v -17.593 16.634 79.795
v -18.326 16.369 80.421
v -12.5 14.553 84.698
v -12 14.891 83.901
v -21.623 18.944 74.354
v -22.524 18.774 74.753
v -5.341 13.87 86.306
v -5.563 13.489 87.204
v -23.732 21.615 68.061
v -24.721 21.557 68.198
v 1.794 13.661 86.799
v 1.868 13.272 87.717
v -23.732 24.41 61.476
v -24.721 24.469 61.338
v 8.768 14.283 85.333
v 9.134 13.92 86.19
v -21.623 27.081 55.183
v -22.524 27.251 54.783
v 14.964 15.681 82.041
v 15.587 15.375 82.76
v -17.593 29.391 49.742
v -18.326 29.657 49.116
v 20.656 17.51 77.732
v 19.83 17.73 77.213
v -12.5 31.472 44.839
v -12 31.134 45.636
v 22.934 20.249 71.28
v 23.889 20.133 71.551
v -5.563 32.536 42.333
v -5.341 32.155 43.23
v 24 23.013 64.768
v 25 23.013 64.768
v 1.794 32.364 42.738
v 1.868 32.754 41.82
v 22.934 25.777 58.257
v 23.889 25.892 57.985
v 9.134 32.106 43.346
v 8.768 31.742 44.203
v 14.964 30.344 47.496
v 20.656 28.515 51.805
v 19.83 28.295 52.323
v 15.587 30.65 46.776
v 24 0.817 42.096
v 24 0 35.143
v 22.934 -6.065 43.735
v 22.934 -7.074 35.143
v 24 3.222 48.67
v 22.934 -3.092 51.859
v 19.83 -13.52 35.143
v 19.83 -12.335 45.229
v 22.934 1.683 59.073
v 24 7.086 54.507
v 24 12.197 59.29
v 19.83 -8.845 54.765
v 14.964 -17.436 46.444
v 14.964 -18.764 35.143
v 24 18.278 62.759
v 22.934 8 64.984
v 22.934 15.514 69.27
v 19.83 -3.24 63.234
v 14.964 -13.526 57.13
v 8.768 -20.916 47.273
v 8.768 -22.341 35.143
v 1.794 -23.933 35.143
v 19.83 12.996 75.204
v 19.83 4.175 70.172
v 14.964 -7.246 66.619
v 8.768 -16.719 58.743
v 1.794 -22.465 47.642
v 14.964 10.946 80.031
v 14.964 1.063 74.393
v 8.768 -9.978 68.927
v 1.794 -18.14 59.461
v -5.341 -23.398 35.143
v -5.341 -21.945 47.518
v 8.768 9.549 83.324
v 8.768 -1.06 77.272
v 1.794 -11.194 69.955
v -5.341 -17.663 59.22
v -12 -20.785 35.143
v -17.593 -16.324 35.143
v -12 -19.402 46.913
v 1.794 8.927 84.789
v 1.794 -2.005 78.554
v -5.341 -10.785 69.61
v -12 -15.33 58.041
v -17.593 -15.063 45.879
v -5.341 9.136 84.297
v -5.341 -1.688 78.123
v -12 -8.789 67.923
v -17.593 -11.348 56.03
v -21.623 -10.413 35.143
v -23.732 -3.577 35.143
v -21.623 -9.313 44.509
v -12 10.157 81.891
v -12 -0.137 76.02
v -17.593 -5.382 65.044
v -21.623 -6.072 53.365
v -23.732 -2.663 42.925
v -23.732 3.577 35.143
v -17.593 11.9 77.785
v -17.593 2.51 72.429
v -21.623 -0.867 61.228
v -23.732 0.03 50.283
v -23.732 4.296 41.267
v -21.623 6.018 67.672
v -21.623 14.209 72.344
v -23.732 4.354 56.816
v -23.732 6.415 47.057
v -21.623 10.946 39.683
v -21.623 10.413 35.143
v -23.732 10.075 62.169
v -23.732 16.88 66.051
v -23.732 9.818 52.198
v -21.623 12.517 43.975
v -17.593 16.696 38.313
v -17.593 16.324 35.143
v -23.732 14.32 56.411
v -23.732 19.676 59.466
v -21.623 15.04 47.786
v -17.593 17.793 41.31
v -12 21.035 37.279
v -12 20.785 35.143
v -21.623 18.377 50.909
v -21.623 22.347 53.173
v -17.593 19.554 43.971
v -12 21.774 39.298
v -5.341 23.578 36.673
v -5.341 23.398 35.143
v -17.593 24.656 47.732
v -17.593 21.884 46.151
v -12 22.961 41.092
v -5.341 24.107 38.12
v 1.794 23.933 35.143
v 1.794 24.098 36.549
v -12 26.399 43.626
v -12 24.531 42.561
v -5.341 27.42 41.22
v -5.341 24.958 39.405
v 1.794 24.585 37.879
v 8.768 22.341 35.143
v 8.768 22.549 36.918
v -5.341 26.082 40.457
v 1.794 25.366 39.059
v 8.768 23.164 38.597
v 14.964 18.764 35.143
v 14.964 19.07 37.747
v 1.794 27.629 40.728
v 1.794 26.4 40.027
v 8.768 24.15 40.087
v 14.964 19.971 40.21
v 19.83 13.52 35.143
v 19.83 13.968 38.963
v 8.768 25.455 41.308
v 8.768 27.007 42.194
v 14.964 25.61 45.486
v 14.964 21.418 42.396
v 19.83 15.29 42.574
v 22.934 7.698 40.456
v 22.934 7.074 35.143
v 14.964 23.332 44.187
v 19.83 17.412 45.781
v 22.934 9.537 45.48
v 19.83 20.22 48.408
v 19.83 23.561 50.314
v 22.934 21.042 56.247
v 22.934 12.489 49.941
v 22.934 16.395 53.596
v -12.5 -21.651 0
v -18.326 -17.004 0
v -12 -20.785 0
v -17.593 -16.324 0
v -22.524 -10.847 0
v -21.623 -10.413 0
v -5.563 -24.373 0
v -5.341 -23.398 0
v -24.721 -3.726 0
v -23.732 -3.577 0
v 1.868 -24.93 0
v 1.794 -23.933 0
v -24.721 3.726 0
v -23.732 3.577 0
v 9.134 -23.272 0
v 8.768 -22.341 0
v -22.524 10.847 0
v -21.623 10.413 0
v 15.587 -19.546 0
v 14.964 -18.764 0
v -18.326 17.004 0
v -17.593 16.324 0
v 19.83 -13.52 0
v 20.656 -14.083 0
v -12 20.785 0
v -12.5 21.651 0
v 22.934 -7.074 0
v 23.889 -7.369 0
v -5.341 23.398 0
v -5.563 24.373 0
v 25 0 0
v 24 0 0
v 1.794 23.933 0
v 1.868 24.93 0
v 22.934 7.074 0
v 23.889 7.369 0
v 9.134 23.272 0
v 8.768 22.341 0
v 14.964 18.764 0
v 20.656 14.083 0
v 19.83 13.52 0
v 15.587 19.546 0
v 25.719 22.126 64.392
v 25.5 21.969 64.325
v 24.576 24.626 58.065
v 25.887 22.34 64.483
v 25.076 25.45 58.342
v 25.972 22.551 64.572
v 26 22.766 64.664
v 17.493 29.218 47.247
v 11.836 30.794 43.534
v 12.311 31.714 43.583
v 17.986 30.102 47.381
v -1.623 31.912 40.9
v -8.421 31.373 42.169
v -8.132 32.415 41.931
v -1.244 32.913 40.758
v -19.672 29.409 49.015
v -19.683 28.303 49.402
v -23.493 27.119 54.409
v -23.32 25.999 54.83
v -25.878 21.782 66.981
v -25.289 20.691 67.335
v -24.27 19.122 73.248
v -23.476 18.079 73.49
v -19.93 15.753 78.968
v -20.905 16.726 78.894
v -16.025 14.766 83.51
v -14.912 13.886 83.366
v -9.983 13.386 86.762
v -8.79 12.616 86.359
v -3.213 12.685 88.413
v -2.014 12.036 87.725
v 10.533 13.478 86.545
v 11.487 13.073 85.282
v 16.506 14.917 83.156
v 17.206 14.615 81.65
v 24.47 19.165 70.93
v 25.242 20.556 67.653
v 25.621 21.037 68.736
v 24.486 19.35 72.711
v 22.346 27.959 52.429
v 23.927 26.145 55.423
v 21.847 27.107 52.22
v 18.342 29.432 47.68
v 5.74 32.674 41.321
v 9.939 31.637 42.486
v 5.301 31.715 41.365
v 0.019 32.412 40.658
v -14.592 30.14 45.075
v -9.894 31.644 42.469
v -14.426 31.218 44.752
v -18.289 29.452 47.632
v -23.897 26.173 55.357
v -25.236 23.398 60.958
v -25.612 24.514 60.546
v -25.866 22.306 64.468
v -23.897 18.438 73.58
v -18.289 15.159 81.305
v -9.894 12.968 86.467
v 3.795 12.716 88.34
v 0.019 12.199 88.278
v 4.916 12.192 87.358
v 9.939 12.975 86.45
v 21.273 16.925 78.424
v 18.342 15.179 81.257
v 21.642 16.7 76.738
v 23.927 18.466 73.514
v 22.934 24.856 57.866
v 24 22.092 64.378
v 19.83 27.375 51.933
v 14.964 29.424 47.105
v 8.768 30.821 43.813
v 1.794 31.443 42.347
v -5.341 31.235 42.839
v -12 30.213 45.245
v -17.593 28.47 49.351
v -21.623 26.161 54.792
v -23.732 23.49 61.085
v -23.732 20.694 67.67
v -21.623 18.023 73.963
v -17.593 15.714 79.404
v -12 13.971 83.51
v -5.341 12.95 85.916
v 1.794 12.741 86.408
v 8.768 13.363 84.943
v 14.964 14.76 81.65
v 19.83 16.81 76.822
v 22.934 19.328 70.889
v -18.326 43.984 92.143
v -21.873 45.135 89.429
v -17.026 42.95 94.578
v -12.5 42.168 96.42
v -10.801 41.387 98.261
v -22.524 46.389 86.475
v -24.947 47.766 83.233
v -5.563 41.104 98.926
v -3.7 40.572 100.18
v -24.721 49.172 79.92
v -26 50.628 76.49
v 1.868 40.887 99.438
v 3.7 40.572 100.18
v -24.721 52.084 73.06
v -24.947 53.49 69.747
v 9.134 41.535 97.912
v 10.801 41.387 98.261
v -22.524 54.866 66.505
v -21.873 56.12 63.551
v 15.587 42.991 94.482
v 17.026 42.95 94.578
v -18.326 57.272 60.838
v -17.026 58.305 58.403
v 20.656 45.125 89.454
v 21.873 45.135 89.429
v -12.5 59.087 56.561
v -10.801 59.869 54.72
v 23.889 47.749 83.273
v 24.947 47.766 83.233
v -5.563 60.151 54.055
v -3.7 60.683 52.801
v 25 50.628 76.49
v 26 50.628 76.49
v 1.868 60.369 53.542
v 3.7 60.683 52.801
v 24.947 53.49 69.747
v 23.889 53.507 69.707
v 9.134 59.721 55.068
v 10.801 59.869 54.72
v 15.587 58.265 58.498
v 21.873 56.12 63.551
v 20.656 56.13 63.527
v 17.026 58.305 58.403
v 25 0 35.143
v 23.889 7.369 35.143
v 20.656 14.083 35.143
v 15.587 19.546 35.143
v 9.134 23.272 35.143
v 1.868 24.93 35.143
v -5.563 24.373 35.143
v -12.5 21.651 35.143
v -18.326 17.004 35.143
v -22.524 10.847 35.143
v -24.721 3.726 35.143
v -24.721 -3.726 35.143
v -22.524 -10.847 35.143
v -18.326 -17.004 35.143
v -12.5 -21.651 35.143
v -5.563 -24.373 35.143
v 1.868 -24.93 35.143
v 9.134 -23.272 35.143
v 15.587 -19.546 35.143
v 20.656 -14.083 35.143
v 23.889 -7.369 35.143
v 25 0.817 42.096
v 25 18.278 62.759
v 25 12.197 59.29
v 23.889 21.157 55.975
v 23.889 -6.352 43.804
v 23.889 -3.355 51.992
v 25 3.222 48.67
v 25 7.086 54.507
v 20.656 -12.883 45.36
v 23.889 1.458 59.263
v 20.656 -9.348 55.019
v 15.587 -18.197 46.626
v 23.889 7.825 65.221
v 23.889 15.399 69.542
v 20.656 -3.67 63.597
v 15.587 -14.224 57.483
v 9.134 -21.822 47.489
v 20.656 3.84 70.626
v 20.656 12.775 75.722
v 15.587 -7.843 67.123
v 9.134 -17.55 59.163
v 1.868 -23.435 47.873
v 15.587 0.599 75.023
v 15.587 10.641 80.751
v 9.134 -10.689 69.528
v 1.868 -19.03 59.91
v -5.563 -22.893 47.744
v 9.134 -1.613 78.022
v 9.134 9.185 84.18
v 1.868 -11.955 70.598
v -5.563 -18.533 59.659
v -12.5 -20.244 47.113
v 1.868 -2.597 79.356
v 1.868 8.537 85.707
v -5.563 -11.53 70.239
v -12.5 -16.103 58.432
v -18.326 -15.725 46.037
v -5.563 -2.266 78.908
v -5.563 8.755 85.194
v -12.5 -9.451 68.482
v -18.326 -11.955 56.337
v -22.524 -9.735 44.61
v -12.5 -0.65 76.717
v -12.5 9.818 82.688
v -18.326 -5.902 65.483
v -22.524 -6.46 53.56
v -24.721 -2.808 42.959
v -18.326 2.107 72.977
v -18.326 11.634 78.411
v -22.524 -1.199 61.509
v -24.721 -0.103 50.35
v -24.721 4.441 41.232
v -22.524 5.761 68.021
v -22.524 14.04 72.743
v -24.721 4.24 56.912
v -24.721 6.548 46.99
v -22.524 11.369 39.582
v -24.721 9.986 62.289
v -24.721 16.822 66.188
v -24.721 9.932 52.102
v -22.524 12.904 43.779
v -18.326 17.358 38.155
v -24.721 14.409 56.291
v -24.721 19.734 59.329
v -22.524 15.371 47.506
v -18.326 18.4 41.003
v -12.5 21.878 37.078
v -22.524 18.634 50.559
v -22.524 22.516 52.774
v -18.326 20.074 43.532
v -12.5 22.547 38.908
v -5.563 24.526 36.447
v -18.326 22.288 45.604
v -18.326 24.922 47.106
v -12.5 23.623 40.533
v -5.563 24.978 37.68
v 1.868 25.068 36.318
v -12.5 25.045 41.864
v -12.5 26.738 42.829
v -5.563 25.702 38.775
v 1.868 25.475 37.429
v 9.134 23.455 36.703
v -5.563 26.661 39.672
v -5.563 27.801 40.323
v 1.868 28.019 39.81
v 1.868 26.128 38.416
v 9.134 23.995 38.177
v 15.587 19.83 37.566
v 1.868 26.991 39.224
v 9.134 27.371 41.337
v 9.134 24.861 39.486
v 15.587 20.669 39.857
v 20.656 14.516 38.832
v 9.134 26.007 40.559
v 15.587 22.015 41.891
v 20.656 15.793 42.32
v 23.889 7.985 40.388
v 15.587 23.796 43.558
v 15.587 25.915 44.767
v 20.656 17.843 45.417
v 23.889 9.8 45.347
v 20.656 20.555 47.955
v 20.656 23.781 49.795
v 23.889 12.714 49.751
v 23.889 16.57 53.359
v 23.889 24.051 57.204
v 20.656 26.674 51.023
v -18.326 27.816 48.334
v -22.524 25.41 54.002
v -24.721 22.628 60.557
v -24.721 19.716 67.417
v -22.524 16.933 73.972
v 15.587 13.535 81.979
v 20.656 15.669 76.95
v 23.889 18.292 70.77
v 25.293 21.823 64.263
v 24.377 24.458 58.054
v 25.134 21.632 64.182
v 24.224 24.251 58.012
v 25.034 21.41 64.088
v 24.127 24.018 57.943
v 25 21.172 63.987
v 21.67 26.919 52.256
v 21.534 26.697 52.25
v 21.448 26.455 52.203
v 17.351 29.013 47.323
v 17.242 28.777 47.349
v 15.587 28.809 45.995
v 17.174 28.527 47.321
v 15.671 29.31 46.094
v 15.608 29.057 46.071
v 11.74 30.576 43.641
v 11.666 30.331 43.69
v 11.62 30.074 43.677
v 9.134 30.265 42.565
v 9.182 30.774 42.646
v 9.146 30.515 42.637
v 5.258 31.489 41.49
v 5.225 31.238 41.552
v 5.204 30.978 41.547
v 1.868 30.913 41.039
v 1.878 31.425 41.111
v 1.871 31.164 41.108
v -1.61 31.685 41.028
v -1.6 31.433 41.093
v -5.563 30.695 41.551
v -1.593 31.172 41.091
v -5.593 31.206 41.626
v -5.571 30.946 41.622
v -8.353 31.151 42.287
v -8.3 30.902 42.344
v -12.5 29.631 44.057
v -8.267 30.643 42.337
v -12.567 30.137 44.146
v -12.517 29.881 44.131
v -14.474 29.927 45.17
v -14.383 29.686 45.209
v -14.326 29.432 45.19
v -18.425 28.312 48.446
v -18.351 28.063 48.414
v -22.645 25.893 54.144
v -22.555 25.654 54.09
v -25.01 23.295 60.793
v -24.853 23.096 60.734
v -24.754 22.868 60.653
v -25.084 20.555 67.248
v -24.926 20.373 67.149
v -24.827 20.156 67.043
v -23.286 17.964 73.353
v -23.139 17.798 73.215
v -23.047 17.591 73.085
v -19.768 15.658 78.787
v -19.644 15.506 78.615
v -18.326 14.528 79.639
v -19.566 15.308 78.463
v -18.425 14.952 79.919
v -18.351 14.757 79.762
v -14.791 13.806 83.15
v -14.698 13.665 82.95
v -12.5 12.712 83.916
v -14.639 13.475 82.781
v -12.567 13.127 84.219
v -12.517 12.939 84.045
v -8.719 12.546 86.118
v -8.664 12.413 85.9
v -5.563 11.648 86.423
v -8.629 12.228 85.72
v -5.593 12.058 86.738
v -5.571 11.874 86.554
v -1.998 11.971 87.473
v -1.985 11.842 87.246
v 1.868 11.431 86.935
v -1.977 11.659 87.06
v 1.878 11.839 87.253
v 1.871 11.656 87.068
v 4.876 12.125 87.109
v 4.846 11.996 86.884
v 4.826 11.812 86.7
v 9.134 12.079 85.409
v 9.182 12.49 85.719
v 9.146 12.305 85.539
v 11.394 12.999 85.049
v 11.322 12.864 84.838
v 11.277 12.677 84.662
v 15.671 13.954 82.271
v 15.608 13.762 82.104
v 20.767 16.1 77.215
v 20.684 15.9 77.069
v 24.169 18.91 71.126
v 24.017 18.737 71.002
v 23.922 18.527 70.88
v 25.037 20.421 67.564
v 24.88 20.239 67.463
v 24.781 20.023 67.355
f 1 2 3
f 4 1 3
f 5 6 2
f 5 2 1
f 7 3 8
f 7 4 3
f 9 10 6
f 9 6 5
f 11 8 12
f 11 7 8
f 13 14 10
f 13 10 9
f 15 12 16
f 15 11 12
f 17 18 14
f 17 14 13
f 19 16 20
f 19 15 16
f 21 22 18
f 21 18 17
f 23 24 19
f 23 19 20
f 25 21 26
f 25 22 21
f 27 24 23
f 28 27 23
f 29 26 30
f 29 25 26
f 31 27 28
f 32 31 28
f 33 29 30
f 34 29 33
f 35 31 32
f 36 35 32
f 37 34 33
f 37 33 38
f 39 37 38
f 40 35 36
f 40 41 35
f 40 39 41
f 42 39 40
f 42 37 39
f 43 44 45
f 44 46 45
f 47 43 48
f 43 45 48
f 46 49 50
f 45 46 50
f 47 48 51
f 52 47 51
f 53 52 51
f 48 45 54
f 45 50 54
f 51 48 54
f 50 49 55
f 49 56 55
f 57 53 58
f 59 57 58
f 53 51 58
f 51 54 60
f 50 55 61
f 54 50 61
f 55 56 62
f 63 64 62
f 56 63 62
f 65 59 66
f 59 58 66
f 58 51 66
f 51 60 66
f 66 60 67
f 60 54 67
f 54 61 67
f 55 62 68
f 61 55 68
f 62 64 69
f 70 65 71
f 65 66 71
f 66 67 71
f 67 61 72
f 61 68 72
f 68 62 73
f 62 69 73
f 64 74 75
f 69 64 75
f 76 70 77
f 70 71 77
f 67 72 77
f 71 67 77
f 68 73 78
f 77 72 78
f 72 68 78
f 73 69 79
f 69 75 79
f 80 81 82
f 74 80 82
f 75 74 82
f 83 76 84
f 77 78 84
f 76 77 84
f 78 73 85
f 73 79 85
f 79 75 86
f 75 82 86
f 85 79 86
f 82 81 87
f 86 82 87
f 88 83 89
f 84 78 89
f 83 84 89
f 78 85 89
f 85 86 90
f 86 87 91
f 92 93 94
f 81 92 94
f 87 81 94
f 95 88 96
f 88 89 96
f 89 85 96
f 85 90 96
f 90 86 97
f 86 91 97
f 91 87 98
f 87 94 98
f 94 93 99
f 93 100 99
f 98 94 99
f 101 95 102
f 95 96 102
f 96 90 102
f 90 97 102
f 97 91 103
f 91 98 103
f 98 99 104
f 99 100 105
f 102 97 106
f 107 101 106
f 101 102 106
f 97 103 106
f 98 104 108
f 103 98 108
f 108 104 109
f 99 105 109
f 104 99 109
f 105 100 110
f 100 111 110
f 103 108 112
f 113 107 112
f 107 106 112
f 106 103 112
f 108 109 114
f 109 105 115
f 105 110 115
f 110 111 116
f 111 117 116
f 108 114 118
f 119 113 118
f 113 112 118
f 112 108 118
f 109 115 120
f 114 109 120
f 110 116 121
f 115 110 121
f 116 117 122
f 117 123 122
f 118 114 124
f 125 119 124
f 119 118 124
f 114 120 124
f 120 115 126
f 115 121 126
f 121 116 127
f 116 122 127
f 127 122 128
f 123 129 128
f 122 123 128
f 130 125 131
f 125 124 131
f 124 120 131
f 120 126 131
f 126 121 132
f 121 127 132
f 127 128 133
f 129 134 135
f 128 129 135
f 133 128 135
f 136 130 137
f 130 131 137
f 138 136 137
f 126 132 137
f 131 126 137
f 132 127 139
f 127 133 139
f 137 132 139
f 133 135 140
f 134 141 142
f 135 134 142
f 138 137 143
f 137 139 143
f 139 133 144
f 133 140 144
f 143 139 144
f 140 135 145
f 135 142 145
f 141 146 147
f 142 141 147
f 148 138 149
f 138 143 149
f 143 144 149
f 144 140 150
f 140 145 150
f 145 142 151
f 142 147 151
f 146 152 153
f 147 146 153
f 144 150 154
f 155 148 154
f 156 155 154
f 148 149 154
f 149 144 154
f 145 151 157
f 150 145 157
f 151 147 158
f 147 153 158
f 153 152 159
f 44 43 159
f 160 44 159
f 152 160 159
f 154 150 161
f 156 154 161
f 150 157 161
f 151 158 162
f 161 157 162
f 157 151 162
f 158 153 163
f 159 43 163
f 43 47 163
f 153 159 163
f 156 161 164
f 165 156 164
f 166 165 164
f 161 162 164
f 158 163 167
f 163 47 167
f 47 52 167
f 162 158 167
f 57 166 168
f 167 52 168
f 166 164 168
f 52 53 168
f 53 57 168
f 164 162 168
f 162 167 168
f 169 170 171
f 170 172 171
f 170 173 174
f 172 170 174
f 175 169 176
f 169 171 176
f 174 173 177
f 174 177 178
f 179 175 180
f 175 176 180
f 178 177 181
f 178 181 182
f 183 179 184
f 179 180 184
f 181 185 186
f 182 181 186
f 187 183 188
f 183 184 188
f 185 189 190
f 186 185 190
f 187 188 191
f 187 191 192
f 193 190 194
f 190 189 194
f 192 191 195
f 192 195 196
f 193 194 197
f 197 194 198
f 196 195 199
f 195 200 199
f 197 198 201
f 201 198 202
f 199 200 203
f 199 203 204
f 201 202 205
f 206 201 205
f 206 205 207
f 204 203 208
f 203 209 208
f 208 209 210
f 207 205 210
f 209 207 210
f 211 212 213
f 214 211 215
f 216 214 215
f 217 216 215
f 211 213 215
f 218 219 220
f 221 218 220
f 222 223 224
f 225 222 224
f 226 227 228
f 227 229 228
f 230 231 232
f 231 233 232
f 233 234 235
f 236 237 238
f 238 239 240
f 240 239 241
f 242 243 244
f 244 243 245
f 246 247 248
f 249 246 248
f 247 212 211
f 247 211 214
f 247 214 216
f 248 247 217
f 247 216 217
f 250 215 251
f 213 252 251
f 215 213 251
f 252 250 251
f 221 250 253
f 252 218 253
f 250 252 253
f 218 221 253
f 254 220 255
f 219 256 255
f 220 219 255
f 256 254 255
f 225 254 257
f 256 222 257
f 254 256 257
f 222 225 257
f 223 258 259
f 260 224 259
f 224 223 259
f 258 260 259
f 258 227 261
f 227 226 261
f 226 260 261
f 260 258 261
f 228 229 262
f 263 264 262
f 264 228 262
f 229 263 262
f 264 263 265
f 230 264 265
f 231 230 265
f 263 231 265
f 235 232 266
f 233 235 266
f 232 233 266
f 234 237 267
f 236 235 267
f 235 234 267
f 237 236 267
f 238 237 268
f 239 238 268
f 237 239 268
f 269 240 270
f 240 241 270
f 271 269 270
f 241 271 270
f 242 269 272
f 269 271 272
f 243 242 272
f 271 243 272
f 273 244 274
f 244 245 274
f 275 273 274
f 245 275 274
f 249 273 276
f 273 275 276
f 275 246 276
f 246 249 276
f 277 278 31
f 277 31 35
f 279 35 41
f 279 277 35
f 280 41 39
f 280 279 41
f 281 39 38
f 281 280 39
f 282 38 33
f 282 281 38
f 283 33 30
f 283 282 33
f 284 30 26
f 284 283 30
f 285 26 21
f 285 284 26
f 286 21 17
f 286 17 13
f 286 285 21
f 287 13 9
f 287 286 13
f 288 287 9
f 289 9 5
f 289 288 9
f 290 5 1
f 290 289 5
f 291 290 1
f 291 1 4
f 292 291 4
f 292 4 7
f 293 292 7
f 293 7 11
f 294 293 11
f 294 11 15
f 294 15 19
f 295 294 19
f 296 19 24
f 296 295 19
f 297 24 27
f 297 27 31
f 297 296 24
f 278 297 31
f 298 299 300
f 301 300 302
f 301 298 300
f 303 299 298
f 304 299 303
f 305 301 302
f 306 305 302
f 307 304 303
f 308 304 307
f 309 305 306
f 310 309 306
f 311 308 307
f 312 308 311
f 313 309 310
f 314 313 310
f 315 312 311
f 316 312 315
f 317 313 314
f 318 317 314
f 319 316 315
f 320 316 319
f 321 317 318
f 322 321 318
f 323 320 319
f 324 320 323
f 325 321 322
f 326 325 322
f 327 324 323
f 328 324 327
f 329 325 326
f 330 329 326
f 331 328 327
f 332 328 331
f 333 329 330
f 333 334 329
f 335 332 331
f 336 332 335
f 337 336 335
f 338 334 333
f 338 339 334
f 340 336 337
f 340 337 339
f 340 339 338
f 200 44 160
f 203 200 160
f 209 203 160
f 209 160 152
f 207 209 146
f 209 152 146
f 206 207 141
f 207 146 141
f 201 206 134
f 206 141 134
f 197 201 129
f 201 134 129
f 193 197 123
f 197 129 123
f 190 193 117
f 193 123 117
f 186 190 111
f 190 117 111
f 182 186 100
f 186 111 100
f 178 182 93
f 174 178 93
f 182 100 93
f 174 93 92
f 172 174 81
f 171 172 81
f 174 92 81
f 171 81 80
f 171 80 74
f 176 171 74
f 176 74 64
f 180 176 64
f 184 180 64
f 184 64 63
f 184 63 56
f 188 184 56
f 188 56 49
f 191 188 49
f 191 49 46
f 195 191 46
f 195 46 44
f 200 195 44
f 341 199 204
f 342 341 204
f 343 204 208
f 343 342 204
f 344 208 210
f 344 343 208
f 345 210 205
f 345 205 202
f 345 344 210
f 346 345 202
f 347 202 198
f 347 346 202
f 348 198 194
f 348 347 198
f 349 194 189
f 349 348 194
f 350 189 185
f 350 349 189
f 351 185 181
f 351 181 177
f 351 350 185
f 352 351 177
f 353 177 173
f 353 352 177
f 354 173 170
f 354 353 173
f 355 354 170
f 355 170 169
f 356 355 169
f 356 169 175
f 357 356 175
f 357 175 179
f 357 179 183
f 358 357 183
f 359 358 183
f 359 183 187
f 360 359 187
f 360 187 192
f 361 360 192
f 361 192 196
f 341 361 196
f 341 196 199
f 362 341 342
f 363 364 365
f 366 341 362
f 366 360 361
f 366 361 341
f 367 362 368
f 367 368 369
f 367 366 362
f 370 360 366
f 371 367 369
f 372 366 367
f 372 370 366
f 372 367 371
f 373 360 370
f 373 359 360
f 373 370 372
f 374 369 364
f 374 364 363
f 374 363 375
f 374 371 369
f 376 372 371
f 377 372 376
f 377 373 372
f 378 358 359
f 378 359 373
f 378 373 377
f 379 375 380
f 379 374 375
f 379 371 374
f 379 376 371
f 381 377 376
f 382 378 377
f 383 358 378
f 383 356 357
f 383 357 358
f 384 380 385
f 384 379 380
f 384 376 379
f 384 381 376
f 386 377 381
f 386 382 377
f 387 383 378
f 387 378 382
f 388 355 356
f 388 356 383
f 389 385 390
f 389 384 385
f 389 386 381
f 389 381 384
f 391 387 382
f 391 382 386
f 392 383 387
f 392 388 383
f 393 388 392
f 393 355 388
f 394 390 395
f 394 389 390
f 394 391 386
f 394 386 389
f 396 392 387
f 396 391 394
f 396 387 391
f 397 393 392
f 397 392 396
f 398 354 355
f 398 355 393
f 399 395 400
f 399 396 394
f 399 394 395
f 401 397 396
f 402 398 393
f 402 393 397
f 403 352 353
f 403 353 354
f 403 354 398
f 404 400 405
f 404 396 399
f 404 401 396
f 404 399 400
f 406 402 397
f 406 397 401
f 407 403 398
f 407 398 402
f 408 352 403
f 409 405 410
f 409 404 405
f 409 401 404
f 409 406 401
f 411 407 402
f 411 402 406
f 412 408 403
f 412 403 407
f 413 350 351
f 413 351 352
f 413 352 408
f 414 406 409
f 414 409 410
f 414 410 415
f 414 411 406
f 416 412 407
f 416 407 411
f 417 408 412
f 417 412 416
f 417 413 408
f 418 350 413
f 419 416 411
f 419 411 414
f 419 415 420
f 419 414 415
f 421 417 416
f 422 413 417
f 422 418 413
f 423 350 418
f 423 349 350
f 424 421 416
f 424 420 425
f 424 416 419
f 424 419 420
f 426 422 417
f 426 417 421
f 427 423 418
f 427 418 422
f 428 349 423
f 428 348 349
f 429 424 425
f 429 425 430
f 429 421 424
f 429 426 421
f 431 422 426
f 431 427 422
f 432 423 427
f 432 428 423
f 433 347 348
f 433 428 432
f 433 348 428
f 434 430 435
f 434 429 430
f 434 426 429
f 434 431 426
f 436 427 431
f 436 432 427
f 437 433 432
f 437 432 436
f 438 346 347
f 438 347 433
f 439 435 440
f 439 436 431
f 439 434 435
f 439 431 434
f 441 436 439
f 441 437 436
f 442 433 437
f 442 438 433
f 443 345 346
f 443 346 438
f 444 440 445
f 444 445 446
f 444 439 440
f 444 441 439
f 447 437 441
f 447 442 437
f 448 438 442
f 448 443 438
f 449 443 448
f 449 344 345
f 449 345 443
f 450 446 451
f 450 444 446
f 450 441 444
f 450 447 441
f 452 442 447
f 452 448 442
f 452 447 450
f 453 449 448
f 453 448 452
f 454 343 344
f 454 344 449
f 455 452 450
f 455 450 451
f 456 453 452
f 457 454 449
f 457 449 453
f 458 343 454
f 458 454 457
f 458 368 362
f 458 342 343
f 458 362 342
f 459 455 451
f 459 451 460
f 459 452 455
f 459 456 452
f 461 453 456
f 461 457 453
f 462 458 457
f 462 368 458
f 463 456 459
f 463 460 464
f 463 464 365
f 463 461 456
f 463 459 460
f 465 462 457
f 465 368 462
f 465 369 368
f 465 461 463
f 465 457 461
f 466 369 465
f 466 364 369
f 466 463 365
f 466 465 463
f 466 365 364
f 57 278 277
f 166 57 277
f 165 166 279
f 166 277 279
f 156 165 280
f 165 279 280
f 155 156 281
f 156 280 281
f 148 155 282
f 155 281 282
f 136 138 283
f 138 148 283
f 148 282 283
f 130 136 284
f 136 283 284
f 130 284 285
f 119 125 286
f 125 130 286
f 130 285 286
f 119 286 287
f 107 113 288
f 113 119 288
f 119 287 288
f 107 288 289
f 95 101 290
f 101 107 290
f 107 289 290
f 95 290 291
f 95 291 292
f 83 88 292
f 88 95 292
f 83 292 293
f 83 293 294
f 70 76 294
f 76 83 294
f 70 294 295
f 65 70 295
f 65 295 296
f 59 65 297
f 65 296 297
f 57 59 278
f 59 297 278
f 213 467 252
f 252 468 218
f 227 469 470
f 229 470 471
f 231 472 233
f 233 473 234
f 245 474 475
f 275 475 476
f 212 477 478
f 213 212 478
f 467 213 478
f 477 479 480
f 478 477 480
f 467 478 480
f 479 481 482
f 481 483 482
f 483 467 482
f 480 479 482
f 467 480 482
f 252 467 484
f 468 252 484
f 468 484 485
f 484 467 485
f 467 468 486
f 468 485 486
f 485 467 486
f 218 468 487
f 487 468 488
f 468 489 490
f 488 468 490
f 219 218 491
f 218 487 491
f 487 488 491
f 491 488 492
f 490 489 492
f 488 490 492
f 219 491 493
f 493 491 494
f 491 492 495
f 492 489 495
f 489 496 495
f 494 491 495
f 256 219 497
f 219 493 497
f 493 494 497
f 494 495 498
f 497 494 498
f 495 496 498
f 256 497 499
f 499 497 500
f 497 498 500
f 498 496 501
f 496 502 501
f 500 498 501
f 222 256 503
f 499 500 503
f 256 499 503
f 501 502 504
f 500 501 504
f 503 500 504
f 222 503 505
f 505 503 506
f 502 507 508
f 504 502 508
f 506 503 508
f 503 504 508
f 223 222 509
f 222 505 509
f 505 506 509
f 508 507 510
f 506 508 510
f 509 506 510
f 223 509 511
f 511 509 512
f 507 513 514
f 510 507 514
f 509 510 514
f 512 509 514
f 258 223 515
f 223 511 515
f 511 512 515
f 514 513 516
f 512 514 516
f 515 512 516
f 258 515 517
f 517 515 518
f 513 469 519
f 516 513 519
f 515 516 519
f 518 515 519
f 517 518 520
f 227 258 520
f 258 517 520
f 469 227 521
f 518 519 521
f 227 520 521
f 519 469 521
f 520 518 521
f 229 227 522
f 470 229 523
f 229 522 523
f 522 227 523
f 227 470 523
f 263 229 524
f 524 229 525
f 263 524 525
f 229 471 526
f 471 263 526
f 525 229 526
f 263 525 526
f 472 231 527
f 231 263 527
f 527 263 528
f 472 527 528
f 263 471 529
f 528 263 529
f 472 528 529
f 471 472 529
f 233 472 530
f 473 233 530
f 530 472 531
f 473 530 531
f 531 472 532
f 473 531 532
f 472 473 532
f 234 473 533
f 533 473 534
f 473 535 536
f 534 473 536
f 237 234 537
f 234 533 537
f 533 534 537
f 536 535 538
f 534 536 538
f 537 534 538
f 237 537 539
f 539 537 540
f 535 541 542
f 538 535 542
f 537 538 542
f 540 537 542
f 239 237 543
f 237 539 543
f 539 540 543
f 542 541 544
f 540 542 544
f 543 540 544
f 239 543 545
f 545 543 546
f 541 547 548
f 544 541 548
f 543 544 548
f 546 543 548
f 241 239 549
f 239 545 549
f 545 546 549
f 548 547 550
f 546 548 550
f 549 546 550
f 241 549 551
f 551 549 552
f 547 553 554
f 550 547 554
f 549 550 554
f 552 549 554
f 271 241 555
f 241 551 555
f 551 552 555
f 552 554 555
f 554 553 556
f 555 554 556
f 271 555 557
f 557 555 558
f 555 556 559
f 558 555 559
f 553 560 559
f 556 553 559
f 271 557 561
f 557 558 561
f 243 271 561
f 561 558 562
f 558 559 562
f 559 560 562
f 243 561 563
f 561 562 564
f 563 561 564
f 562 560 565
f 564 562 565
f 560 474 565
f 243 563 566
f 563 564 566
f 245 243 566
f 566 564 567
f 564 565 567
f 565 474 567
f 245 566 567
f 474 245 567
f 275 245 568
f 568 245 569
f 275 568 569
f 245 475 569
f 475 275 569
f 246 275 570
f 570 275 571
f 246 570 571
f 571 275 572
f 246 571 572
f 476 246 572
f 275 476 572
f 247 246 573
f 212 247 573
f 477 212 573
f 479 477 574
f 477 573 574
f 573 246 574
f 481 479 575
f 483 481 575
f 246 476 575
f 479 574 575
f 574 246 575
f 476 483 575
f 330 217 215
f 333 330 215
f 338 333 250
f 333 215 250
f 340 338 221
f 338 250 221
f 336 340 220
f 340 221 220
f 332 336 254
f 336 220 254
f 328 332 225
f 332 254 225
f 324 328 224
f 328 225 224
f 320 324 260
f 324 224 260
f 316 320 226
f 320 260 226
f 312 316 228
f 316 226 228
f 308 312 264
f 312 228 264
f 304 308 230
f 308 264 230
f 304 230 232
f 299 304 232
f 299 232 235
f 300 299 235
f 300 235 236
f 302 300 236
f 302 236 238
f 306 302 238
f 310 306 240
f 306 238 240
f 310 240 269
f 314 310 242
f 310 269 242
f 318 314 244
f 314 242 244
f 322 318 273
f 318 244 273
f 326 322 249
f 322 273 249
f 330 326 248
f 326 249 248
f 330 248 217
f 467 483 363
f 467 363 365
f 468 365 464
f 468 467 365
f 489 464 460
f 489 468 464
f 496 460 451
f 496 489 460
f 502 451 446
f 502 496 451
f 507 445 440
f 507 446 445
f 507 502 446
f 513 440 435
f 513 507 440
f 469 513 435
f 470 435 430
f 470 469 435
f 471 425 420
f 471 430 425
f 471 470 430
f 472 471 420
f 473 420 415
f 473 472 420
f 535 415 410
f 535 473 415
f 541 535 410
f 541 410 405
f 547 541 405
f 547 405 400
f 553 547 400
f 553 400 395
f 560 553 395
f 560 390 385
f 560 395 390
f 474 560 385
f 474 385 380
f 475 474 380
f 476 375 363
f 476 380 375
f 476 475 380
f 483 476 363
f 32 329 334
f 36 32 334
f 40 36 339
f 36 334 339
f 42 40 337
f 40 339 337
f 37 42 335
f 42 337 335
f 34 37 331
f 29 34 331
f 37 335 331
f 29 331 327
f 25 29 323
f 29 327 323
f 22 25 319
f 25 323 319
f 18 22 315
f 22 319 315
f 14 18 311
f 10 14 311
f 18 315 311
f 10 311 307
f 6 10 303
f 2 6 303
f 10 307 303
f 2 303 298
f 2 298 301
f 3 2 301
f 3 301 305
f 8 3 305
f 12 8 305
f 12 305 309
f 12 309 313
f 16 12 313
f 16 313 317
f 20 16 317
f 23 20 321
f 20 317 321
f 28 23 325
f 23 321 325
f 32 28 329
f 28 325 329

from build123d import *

# Parameters (mm, degrees)
ESQUISSE6_R        = 25
ESQUISSE6_R_2      = 24
ESQUISSE8_R        = 26
ESQUISSE8_R_2      = 24
EXTRU_MINCE1_DEPTH = 1
EXTRU_MINCE2_START = 30
ESQUISSE9_R        = 26
ESQUISSE9_R_2      = 25
EXTRU_MINCE2_DEPTH = 30
CONG_1_R           = 1
CONG_2_R           = 1


with BuildPart() as part:
    # Balayage-Mince2: sweep along a path in Esquisse7
    with BuildLine(Plane(origin=(0, 0, 0), x_dir=(0, 0, -1), z_dir=(1, 0, 0))) as balayage_mince2_path:
        Line((0, 0), (-35.14343316412919, -3.47e-15))
        ThreePointArc((-35.14343316412919, -3.47e-15), (-51.70154272349097, 4.983425337984965), (-62.75857876770245, 18.27806614532184))
        Line((-62.75857876770245, 18.27806614532184), (-64.37754708374251, 22.092116482858586))
    # Esquisse6 → Balayage-Mince2 (sweep)
    with BuildSketch(Plane.XY):
        Circle(ESQUISSE6_R)
        Circle(ESQUISSE6_R_2, mode=Mode.SUBTRACT)
    sweep(path=balayage_mince2_path.line)



with BuildPart() as body_2:
    # Esquisse8 → Extru.-Mince1 (new body)
    with BuildSketch(Plane(origin=(0, 41.87396099217143, 17.77444189612002), x_dir=(1, 0, 0), z_dir=(0, 0.9205048534524412, 0.39073112848927183))):
        with Locations((0, -50.62776693988426)):
            Circle(ESQUISSE8_R)
        with Locations((0, -50.62776693988426)):
            Circle(ESQUISSE8_R_2, mode=Mode.SUBTRACT)
    extrude(amount=EXTRU_MINCE1_DEPTH)


with BuildPart() as part_1:
    add(part.part)

    add(body_2.part)  # Extru.-Mince2 merges body 2
    # Esquisse9 → Extru.-Mince2 (add)
    with BuildSketch(Plane(origin=(0, 42.794465845623876, 18.16517302460929), x_dir=(1, 0, 0), z_dir=(0, 0.9205048534524412, 0.39073112848927183)).offset(EXTRU_MINCE2_START)):
        with Locations((0, -50.627766939884246)):
            Circle(ESQUISSE9_R)
        with Locations((0, -50.627766939884246)):
            Circle(ESQUISSE9_R_2, mode=Mode.SUBTRACT)
    extrude(amount=-EXTRU_MINCE2_DEPTH)

    # Congé1
    cong_1_edges = [part_1.edges().sort_by_distance(p)[0] for p in [
        (-25, 22.09211648285859, 64.3775470837425),
    ]]
    fillet(cong_1_edges, radius=CONG_1_R - 0.0001)  # a hair under: the kernel refuses the full size

    # Congé2
    cong_2_edges = [part_1.edges().sort_by_distance(p)[0] for p in [
        (-26, 22.092116482858604, 64.37754708374253),
    ]]
    fillet(cong_2_edges, radius=CONG_2_R)


solid = part_1.part
